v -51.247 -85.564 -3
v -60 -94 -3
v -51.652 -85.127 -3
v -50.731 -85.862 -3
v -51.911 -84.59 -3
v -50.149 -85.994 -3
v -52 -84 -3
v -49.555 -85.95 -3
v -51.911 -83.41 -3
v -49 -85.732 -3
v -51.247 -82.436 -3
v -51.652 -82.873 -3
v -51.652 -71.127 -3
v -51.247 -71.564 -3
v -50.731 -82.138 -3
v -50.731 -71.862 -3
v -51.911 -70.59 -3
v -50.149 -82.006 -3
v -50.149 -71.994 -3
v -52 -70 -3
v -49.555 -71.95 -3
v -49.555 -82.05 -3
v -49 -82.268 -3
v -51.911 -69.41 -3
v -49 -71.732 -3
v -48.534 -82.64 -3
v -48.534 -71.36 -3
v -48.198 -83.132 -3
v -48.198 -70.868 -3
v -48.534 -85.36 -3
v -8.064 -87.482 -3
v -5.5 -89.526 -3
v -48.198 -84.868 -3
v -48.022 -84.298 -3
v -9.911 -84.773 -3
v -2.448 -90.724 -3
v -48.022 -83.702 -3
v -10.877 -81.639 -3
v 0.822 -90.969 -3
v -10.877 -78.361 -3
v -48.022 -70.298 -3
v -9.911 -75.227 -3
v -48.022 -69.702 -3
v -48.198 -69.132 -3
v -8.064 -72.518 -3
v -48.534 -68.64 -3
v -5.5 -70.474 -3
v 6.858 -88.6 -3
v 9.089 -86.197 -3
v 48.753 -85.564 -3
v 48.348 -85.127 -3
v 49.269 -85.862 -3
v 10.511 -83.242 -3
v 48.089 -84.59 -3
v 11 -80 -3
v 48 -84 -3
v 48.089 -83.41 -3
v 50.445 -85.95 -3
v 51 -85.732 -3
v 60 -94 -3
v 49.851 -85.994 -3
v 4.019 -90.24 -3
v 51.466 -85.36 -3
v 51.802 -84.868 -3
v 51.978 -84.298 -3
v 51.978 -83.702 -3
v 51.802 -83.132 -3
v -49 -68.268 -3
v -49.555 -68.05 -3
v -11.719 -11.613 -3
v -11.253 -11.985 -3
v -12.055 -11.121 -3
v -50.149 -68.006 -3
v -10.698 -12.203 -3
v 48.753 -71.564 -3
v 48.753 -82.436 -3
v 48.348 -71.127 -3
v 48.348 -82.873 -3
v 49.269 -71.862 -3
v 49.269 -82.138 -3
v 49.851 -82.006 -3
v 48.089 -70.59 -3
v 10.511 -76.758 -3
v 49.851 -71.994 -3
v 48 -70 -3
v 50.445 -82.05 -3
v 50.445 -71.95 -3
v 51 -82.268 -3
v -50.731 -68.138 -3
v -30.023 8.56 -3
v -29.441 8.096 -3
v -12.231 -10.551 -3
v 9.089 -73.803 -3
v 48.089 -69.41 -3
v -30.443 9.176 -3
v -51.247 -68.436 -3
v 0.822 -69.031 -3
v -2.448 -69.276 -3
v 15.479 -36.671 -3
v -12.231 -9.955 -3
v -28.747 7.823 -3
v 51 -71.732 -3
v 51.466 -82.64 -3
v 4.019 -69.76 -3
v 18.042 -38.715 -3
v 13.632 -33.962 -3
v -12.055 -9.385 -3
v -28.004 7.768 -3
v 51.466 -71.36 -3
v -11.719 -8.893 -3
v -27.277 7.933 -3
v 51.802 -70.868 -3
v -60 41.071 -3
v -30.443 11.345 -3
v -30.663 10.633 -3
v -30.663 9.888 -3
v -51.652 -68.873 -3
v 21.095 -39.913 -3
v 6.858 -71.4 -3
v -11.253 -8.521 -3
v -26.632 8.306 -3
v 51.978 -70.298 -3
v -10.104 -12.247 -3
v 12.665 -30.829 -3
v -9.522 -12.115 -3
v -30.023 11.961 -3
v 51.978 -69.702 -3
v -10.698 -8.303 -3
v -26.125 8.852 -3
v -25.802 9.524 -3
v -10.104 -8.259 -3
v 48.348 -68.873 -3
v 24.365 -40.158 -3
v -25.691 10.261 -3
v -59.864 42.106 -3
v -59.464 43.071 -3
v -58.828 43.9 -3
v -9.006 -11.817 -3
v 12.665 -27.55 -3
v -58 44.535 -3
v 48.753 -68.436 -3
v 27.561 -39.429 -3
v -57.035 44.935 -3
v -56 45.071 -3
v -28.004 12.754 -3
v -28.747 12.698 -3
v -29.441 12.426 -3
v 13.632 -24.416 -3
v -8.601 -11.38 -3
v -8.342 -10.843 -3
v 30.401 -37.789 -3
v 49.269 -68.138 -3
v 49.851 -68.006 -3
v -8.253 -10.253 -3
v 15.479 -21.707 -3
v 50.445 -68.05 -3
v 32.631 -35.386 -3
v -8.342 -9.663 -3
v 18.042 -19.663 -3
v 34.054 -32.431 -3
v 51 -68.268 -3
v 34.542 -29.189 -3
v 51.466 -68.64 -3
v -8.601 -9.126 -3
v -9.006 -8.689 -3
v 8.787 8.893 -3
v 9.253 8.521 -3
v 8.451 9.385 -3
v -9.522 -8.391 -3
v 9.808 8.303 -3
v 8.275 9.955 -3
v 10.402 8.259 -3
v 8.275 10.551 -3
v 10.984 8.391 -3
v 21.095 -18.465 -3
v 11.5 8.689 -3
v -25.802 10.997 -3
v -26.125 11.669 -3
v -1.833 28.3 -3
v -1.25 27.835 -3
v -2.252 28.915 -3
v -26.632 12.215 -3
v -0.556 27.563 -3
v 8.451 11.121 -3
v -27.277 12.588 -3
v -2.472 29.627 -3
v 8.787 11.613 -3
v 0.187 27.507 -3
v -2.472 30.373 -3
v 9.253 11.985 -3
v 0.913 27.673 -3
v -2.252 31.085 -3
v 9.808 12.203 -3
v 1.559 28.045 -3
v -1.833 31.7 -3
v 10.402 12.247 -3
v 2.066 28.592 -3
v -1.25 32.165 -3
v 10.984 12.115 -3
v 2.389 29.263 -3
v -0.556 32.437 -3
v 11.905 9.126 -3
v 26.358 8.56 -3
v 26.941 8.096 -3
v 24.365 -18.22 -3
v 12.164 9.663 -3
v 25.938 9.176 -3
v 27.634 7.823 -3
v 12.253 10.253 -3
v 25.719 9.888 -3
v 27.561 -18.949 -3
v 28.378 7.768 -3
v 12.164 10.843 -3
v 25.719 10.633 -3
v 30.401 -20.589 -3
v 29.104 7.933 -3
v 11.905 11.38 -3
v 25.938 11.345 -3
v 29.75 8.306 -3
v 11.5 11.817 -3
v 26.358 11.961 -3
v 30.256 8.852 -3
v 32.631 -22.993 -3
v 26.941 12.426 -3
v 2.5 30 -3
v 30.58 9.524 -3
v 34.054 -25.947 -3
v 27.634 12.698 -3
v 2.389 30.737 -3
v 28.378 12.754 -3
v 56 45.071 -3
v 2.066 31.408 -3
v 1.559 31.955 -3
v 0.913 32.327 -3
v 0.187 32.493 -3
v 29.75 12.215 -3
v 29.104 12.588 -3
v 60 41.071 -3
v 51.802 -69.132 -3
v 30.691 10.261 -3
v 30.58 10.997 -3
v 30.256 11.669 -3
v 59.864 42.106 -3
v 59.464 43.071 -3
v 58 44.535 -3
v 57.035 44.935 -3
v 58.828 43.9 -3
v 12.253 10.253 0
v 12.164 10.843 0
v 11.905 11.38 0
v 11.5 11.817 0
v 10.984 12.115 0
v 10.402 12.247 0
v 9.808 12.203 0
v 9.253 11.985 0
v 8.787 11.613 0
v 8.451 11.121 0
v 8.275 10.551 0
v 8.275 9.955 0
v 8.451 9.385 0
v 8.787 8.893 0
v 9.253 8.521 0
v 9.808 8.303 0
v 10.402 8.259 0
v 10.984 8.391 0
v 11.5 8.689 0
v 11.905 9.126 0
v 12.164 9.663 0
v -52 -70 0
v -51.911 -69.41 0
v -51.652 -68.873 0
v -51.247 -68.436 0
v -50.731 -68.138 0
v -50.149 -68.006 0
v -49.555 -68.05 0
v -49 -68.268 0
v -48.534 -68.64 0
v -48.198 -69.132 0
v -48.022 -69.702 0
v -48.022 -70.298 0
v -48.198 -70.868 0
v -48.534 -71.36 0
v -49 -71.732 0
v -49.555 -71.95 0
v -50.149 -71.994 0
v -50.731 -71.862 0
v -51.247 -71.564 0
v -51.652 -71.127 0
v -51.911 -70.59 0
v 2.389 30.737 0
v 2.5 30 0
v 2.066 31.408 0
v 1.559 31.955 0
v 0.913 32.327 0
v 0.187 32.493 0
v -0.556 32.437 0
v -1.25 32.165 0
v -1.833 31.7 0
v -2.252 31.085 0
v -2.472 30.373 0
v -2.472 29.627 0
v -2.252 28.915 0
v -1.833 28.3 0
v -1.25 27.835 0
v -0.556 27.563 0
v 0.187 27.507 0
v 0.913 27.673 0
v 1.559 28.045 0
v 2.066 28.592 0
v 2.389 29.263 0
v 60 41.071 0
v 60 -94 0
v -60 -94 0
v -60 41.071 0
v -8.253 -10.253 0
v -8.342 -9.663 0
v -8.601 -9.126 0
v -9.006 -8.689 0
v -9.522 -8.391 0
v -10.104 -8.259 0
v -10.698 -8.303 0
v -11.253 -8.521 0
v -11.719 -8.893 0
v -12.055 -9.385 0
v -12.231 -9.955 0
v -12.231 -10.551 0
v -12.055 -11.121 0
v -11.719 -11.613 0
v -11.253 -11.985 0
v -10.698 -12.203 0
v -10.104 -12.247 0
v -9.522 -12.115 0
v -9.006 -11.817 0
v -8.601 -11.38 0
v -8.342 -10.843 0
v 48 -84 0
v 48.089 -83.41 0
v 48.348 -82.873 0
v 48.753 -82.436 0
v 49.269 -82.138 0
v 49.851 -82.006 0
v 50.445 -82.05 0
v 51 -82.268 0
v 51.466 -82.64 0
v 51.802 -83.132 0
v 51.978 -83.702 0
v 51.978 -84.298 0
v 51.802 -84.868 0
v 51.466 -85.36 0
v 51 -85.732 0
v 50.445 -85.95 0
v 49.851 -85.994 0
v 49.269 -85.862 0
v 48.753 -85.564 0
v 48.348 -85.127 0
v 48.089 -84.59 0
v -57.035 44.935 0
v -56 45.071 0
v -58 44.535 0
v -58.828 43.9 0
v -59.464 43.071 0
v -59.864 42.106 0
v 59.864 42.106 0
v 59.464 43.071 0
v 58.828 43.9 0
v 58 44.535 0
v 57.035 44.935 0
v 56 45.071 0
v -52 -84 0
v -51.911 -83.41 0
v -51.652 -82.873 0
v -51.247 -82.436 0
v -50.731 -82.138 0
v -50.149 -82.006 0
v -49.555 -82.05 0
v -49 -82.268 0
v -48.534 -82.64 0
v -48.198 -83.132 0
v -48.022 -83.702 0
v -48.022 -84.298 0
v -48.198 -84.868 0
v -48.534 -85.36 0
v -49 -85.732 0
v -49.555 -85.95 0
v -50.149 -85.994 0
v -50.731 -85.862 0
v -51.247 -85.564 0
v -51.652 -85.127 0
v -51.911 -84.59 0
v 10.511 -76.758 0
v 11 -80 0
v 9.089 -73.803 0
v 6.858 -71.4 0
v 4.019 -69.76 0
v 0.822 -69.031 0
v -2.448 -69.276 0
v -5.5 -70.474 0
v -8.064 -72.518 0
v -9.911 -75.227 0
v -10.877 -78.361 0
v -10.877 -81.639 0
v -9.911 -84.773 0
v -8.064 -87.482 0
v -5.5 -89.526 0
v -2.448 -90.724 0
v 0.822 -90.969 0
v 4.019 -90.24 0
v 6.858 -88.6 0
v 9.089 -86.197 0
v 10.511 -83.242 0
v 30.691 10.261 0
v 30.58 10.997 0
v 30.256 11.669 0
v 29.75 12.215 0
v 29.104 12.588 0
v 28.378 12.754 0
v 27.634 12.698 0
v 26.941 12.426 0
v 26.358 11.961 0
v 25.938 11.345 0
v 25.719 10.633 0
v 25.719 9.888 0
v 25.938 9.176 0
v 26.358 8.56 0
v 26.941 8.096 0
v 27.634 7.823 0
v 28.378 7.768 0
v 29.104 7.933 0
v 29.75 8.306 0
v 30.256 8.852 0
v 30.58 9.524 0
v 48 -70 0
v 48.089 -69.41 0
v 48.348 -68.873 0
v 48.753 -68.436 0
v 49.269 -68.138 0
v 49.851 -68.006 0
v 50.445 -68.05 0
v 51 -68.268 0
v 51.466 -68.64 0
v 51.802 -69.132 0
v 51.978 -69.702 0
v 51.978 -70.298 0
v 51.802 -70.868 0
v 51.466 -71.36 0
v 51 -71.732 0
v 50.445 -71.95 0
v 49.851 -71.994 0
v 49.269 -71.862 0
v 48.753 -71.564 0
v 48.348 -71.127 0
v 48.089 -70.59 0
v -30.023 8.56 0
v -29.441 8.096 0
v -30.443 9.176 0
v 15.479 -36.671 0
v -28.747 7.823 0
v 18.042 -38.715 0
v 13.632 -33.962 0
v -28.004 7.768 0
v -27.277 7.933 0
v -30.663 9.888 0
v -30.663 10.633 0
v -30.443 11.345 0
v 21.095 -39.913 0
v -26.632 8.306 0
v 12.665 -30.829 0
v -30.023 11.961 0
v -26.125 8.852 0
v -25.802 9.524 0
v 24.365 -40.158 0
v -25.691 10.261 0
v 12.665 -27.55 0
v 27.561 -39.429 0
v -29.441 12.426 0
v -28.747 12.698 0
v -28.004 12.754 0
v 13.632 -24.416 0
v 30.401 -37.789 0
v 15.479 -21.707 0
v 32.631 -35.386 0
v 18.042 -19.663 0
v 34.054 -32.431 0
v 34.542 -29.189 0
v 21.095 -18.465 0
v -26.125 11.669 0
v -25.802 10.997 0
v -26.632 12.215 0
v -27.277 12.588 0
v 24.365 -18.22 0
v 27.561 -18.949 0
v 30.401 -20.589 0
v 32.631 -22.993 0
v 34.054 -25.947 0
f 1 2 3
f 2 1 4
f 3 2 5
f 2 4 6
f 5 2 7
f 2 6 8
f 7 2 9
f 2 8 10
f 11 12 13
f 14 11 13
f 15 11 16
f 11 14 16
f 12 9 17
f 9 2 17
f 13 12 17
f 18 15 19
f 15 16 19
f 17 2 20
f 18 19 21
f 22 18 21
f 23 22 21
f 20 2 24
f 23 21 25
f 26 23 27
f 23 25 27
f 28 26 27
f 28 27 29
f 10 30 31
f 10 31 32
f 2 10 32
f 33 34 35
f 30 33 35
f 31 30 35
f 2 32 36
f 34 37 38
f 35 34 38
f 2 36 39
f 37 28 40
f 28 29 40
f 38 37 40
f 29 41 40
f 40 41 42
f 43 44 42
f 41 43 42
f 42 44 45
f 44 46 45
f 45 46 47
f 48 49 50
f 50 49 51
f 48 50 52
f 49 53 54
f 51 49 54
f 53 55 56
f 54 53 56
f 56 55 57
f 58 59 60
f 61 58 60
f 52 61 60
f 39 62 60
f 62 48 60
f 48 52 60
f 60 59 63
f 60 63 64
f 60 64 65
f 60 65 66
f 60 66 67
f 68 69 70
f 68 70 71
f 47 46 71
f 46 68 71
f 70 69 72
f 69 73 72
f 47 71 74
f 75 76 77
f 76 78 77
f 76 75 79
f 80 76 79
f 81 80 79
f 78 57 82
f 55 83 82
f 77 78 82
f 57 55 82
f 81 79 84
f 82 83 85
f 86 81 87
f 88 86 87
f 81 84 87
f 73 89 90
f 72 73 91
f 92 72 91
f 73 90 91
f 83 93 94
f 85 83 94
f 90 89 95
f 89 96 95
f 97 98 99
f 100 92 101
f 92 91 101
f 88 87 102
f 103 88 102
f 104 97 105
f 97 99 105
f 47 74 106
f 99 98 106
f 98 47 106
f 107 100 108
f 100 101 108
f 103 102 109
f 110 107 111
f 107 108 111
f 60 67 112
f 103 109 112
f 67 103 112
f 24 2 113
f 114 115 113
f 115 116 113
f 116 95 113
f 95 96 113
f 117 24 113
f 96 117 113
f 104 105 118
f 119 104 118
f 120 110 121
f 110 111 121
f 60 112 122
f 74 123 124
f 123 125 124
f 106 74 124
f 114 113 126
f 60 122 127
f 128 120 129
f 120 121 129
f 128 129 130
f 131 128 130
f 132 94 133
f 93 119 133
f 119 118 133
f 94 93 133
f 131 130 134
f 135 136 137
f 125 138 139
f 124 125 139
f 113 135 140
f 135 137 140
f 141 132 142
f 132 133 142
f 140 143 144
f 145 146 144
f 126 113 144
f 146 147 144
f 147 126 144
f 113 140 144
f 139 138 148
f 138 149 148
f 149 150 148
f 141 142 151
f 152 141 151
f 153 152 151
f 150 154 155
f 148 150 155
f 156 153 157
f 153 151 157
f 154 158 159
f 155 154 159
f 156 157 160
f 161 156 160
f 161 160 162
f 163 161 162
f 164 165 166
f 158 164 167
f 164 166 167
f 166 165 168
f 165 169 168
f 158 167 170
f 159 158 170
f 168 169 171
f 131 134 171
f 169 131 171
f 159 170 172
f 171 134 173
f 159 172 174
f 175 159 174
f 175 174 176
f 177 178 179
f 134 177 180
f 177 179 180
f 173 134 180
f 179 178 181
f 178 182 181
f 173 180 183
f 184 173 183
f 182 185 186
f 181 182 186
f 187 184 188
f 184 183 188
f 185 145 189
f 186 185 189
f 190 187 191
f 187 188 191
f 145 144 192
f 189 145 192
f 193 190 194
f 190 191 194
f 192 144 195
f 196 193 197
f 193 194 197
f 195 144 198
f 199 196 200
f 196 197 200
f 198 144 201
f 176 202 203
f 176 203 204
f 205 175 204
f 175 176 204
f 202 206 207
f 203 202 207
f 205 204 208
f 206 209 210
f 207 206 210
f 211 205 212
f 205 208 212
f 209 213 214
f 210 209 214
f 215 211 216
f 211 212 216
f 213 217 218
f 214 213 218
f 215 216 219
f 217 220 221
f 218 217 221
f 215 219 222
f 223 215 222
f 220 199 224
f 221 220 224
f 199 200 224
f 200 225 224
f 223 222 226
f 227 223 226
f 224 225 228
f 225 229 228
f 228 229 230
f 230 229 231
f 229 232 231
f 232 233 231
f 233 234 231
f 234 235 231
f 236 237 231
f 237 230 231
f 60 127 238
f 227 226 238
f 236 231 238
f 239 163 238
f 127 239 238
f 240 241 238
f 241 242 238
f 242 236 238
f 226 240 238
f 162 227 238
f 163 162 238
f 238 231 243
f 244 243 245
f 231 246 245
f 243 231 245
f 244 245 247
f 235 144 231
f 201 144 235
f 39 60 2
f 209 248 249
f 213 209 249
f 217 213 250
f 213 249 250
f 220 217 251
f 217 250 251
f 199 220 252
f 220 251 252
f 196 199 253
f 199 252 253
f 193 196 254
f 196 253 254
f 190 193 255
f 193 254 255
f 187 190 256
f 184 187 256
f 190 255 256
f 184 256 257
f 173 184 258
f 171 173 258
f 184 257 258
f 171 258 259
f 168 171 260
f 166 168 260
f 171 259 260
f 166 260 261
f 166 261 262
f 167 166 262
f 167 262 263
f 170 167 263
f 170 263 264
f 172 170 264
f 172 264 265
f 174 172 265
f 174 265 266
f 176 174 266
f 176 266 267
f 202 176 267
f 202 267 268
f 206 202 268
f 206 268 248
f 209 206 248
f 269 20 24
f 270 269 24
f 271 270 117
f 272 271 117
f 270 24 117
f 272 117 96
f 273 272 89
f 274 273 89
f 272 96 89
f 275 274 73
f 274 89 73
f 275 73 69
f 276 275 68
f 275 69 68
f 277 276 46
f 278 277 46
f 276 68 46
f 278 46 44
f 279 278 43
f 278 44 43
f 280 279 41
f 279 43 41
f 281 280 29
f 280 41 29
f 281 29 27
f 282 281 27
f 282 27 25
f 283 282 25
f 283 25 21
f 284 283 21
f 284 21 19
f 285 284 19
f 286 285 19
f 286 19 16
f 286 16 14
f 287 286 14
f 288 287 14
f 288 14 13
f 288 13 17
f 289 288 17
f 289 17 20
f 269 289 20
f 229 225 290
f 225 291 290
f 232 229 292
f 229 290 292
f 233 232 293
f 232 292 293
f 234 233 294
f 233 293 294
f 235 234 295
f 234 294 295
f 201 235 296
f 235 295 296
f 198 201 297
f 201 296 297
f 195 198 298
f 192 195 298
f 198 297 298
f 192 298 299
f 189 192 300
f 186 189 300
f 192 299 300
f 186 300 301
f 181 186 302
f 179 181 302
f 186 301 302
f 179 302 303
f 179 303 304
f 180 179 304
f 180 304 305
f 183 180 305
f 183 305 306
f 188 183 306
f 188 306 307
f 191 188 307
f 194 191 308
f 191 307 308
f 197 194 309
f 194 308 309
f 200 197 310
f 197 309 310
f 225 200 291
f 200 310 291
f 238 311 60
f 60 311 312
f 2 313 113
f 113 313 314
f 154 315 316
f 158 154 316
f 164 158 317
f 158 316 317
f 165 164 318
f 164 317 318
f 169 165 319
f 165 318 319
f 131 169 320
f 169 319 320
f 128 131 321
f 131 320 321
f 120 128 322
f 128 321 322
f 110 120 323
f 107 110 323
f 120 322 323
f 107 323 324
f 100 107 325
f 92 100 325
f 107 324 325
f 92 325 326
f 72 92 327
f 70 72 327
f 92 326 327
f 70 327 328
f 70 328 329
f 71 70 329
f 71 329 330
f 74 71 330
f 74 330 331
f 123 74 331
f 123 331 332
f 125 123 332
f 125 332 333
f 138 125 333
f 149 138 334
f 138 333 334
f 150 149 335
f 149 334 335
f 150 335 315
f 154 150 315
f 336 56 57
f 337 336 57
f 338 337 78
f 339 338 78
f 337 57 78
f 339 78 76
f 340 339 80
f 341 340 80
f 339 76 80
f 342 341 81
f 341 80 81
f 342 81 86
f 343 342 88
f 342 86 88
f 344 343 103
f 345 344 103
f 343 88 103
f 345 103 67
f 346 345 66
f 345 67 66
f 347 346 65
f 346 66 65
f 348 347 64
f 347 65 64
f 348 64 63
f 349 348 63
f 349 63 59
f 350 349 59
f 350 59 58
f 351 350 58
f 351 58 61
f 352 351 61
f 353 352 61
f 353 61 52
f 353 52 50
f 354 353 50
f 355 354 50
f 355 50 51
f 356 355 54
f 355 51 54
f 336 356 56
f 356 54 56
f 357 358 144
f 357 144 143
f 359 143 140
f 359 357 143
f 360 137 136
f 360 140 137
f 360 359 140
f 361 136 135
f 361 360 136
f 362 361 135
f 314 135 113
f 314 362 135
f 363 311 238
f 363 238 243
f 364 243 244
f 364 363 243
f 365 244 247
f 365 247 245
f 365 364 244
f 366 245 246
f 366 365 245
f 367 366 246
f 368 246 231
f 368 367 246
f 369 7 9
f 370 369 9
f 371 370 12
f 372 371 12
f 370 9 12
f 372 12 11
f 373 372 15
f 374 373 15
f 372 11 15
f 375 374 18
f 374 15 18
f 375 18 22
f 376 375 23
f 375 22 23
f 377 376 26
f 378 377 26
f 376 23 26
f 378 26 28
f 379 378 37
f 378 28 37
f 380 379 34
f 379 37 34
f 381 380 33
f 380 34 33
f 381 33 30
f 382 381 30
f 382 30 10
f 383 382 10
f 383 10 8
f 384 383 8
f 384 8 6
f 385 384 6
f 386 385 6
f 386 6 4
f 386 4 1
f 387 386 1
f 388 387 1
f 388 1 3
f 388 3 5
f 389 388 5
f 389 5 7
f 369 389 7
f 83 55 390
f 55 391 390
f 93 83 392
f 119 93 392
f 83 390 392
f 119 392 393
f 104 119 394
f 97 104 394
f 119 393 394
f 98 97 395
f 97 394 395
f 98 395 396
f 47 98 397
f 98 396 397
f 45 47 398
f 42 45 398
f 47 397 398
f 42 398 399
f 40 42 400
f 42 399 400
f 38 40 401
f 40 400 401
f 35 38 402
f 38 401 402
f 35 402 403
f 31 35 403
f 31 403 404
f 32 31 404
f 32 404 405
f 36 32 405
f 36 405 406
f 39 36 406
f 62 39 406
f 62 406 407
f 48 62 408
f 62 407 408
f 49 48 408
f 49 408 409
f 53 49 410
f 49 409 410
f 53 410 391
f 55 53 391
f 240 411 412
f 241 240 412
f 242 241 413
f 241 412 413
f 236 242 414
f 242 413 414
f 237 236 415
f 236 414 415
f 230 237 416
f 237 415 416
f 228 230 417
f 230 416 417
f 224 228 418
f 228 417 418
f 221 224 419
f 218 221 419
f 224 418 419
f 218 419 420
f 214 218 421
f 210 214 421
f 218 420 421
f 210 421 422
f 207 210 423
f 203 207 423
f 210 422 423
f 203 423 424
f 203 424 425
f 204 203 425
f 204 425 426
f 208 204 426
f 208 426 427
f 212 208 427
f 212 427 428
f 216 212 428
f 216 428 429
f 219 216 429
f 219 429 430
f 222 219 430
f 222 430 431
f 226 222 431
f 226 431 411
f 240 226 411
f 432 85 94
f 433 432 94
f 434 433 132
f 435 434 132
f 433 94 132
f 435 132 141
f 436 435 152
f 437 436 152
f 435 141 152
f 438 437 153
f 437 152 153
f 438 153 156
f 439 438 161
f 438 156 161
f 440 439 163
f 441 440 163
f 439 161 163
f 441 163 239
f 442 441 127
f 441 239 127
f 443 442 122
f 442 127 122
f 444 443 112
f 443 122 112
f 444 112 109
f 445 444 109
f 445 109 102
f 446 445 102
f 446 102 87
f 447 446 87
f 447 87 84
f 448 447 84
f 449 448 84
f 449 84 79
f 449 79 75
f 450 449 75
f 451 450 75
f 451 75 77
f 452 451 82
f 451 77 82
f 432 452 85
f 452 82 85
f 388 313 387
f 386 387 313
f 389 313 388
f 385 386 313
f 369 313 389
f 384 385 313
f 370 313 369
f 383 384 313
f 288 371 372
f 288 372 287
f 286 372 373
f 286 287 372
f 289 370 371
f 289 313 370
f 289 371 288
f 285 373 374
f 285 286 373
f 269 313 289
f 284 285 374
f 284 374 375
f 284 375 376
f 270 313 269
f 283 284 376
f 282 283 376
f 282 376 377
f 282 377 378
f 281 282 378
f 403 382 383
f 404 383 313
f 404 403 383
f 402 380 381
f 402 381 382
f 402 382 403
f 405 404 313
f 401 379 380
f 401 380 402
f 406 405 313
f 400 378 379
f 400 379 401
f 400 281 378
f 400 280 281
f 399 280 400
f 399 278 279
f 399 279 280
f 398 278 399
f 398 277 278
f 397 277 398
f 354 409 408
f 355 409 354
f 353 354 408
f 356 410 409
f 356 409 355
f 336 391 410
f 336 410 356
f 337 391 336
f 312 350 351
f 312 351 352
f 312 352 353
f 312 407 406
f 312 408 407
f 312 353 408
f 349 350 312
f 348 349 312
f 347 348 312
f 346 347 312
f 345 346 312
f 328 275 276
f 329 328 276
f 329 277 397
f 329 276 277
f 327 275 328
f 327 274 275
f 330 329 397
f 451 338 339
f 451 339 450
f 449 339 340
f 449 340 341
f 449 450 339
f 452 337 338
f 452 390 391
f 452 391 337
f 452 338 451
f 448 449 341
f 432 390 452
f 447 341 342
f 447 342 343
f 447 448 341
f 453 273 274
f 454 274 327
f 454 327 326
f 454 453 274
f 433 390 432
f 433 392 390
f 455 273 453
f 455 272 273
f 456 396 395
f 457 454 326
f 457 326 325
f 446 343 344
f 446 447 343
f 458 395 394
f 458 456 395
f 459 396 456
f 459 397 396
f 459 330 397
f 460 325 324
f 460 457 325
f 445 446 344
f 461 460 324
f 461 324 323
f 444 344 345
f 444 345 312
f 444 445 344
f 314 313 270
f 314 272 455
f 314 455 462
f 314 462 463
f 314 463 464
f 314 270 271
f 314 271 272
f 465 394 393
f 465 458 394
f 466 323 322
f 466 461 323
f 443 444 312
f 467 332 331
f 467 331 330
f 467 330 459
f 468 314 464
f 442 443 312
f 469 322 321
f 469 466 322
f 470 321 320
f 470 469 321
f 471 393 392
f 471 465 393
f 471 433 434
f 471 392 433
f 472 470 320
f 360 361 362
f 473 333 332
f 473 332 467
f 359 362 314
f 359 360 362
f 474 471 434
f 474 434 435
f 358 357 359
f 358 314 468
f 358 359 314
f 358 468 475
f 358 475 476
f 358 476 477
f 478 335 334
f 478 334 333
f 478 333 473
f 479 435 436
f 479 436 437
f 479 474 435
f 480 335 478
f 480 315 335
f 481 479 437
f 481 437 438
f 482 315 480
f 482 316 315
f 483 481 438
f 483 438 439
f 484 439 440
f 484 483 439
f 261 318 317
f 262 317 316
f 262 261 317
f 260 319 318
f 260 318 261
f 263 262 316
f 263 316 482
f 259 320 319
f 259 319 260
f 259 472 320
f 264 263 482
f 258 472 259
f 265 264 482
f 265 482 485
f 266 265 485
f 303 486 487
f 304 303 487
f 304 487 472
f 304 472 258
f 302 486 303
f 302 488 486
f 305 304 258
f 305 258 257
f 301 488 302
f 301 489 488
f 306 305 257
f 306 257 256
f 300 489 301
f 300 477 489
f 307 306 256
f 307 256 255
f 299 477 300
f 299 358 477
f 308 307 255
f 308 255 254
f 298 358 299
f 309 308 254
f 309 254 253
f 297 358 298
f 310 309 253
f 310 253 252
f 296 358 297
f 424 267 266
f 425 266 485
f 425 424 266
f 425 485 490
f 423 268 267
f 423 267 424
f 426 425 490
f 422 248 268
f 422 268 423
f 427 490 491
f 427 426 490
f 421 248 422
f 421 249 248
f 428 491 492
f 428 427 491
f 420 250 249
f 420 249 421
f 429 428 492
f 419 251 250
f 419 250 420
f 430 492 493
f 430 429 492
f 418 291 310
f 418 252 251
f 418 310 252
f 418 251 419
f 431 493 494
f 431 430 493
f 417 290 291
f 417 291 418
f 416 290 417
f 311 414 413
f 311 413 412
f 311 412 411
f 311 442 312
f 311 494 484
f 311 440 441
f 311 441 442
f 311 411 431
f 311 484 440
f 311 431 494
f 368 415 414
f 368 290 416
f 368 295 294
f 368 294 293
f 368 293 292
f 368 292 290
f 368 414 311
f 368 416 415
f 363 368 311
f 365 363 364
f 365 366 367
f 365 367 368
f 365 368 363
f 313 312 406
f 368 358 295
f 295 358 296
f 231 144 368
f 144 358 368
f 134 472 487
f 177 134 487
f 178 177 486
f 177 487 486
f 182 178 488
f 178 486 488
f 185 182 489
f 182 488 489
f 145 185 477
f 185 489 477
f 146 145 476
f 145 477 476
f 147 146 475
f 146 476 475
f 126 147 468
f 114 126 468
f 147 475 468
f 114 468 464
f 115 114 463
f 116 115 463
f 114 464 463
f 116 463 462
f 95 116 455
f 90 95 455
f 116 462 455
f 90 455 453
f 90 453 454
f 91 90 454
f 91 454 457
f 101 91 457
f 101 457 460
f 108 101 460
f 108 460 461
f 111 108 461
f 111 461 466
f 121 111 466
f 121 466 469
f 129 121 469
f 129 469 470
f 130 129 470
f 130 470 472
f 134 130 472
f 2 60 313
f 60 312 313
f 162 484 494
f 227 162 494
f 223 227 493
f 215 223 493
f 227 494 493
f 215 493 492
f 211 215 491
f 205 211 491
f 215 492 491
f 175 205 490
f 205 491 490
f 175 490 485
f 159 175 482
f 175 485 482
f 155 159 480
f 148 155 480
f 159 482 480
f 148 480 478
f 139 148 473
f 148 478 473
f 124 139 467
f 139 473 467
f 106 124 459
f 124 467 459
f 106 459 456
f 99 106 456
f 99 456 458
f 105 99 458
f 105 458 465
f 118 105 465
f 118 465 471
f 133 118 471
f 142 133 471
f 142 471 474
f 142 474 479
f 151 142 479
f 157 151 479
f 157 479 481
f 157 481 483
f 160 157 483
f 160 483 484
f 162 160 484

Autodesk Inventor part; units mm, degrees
ref_plane "YZ Plane" through (0, 0, 0) normal (1, 0, 0) x (0, 1, 0)
ref_plane "XZ Plane" through (0, 0, 0) normal (0, 1, 0) x (-1, 0, 0)
ref_plane "XY Plane" through (0, 0, 0) normal (0, 0, 1) x (1, 0, 0)
sketch "スケッチ1" plane through (0, 0, 0) normal (0, 0, 1) x (1, 0, 0)
  circle A0 centre (0, 0) radius 7.5
  circle A1 centre (0, 0) radius 30
  circle A2 centre (0, 0) radius 37.5
  circle A3 centre (23.5425, -29.1891) radius 30
  circle A4 centre (23.5425, -29.1891) radius 4
  circle A5 centre (23.5425, -29.1891) radius 16
  circle A6 centre (23.5425, -29.1891) radius 56
  circle A7 centre (0, -80) radius 40
  circle A8 centre (0, -80) radius 50
  circle A9 centre (0, -80) radius 4
  dimension "d57" = 75
  dimension "d64" = 112
  dimension "d41" = 15
  dimension "d58" = 8
  dimension "d63" = 32
  dimension "d65" = 100
  dimension "d66" = 8
sketch "スケッチ2" plane through (0, 0, 0) normal (0, 0, 1) x (1, 0, 0)
  line L0 (0, 0) -> (24.502, 0) construction
  line L1 (0, 0) -> (12.5, 0) construction
  line L2 (0, 0) -> (10.253, 10.253)
  line L3 (0, 0) -> (14.5, 0) construction
  line L4 (10.253, 10.253) -> (-10.253, -10.253)
  circle A0 centre (10.253, 10.253) radius 2
  circle A1 centre (-10.253, -10.253) radius 2
  circle A2 centre (0, 0) radius 7.5
  line L5 (0, 0) -> (28.1908, 10.2606)
  line L6 (0, 0) -> (30, 0) construction
  line L7 (0, 0) -> (-28.1908, 10.2606)
  line L8 (0, 0) -> (30, 0) construction
  circle A3 centre (-28.1908, 10.2606) radius 2.5
  line L9 (0, 0) -> (0, 30)
  circle A4 centre (0, 30) radius 2.5
  circle A5 centre (28.1908, 10.2606) radius 2.5
  dimension "d9" = 14.5
  dimension "d10" = 45
  dimension "d11" = 29
  dimension "d12" = 4
  dimension "d13" = 4
  dimension "d14" = 15
  dimension "d15" = 30
  dimension "d16" = 20
  dimension "d17" = 30
  dimension "d18" = 160
  dimension "d19" = 5
  dimension "d20" = 30
  dimension "d21" = 5
  dimension "d22" = 5
sketch "スケッチ3" plane through (0, 0, 0) normal (0, 0, 1) x (1, 0, 0)
  line L0 (60, -99.3436) -> (-60, -99.3436)
  line L1 (-60, -99.3436) -> (-60, 99.3436)
  line L2 (-60, 99.3436) -> (60, 99.3436)
  line L3 (60, 99.3436) -> (60, -99.3436)
  line L4 (60, -99.3436) -> (-60, 99.3436) construction
  line L5 (-60, -99.3436) -> (60, 99.3436) construction
  point P0 (0, 0)
  dimension "d25" = 120
extrude "押し出し1" add sketch "スケッチ3" against normal blind 3
sketch "スケッチ4" plane through (0, 0, 0) normal (0, 0, 1) x (1, 0, 0)
  line L0 (0, 45.0711) -> (68.3595, 45.0711)
  line L1 (68.3595, 45.0711) -> (-74.3824, 45.0711)
  line L2 (-74.3824, 45.0711) -> (108.1656, 45.0711)
  line L3 (108.1656, 45.0711) -> (108.1656, 129.4154)
  line L4 (108.1656, 129.4154) -> (-74.3824, 129.4154)
  line L5 (-74.3824, 129.4154) -> (-74.3824, 45.0711)
  point P0 (0, 0)
extrude "押し出し4" cut sketch "スケッチ4" against normal blind 10
fillet "フィレット1" radius 4 4 edges at (-60, 45.0711, -1.5) (60, 45.0711, -1.5) (-60, -99.3436, -1.5) (60, -99.3436, -1.5)
extrude "押し出し9" cut sketch "スケッチ1" against normal blind 10 contours A4 A2 | A2 A4 | A9 A6 | A6 A9
sketch "スケッチ8" plane through (0, 0, 0) normal (0, 0, 1) x (1, 0, 0)
  line L0 (-265.6992, -158.784) -> (100.3409, -158.784)
  line L1 (100.3409, -158.784) -> (100.3409, -94)
  line L2 (100.3409, -94) -> (-265.6992, -94)
  line L3 (-265.6992, -94) -> (-265.6992, -158.784)
  line L4 (-265.6992, -158.784) -> (100.3409, -94) construction
  line L5 (100.3409, -158.784) -> (-265.6992, -94) construction
  point P0 (0, 0)
  point P1 (0, -94)
  point P2 (-82.6791, -126.392)
extrude "押し出し10" cut sketch "スケッチ8" against normal blind 10
extrude "押し出し11" cut sketch "スケッチ2" against normal blind 10 contours A0 | A5 | A1 | A3 | A4
sketch "スケッチ9" plane through (0, 0, -3) normal (0, 0, -1) x (-1, 0, 0)
  line L0 (60, -94) -> (-60, -94) projected
  circle A0 centre (-50, -84) radius 2
  circle A1 centre (-50, -70) radius 2
  circle A2 centre (50, -70) radius 2
  circle A3 centre (50, -84) radius 2
  point P0 (0, 0)
  point P1 (-50, -94)
  point P2 (50, -94)
  dimension "d73" = 4
  dimension "d74" = 4
  dimension "d75" = 4
  dimension "d76" = 4
extrude "押し出し12" cut sketch "スケッチ9" against normal blind 10
sketch "スケッチ10" plane through (0, 0, 0) normal (0, 0, 1) x (1, 0, 0)
  circle A0 centre (23.5425, -29.1891) radius 4 projected
  circle A1 centre (23.5425, -29.1891) radius 11
  circle A2 centre (0, -80) radius 4 projected
  circle A3 centre (0, -80) radius 11
  point P0 (0, 0)
  dimension "d79" = 22
  dimension "d80" = 22
extrude "押し出し13" cut sketch "スケッチ10" against normal blind 10
properties part number "板" material "アルミニウム 6061"
